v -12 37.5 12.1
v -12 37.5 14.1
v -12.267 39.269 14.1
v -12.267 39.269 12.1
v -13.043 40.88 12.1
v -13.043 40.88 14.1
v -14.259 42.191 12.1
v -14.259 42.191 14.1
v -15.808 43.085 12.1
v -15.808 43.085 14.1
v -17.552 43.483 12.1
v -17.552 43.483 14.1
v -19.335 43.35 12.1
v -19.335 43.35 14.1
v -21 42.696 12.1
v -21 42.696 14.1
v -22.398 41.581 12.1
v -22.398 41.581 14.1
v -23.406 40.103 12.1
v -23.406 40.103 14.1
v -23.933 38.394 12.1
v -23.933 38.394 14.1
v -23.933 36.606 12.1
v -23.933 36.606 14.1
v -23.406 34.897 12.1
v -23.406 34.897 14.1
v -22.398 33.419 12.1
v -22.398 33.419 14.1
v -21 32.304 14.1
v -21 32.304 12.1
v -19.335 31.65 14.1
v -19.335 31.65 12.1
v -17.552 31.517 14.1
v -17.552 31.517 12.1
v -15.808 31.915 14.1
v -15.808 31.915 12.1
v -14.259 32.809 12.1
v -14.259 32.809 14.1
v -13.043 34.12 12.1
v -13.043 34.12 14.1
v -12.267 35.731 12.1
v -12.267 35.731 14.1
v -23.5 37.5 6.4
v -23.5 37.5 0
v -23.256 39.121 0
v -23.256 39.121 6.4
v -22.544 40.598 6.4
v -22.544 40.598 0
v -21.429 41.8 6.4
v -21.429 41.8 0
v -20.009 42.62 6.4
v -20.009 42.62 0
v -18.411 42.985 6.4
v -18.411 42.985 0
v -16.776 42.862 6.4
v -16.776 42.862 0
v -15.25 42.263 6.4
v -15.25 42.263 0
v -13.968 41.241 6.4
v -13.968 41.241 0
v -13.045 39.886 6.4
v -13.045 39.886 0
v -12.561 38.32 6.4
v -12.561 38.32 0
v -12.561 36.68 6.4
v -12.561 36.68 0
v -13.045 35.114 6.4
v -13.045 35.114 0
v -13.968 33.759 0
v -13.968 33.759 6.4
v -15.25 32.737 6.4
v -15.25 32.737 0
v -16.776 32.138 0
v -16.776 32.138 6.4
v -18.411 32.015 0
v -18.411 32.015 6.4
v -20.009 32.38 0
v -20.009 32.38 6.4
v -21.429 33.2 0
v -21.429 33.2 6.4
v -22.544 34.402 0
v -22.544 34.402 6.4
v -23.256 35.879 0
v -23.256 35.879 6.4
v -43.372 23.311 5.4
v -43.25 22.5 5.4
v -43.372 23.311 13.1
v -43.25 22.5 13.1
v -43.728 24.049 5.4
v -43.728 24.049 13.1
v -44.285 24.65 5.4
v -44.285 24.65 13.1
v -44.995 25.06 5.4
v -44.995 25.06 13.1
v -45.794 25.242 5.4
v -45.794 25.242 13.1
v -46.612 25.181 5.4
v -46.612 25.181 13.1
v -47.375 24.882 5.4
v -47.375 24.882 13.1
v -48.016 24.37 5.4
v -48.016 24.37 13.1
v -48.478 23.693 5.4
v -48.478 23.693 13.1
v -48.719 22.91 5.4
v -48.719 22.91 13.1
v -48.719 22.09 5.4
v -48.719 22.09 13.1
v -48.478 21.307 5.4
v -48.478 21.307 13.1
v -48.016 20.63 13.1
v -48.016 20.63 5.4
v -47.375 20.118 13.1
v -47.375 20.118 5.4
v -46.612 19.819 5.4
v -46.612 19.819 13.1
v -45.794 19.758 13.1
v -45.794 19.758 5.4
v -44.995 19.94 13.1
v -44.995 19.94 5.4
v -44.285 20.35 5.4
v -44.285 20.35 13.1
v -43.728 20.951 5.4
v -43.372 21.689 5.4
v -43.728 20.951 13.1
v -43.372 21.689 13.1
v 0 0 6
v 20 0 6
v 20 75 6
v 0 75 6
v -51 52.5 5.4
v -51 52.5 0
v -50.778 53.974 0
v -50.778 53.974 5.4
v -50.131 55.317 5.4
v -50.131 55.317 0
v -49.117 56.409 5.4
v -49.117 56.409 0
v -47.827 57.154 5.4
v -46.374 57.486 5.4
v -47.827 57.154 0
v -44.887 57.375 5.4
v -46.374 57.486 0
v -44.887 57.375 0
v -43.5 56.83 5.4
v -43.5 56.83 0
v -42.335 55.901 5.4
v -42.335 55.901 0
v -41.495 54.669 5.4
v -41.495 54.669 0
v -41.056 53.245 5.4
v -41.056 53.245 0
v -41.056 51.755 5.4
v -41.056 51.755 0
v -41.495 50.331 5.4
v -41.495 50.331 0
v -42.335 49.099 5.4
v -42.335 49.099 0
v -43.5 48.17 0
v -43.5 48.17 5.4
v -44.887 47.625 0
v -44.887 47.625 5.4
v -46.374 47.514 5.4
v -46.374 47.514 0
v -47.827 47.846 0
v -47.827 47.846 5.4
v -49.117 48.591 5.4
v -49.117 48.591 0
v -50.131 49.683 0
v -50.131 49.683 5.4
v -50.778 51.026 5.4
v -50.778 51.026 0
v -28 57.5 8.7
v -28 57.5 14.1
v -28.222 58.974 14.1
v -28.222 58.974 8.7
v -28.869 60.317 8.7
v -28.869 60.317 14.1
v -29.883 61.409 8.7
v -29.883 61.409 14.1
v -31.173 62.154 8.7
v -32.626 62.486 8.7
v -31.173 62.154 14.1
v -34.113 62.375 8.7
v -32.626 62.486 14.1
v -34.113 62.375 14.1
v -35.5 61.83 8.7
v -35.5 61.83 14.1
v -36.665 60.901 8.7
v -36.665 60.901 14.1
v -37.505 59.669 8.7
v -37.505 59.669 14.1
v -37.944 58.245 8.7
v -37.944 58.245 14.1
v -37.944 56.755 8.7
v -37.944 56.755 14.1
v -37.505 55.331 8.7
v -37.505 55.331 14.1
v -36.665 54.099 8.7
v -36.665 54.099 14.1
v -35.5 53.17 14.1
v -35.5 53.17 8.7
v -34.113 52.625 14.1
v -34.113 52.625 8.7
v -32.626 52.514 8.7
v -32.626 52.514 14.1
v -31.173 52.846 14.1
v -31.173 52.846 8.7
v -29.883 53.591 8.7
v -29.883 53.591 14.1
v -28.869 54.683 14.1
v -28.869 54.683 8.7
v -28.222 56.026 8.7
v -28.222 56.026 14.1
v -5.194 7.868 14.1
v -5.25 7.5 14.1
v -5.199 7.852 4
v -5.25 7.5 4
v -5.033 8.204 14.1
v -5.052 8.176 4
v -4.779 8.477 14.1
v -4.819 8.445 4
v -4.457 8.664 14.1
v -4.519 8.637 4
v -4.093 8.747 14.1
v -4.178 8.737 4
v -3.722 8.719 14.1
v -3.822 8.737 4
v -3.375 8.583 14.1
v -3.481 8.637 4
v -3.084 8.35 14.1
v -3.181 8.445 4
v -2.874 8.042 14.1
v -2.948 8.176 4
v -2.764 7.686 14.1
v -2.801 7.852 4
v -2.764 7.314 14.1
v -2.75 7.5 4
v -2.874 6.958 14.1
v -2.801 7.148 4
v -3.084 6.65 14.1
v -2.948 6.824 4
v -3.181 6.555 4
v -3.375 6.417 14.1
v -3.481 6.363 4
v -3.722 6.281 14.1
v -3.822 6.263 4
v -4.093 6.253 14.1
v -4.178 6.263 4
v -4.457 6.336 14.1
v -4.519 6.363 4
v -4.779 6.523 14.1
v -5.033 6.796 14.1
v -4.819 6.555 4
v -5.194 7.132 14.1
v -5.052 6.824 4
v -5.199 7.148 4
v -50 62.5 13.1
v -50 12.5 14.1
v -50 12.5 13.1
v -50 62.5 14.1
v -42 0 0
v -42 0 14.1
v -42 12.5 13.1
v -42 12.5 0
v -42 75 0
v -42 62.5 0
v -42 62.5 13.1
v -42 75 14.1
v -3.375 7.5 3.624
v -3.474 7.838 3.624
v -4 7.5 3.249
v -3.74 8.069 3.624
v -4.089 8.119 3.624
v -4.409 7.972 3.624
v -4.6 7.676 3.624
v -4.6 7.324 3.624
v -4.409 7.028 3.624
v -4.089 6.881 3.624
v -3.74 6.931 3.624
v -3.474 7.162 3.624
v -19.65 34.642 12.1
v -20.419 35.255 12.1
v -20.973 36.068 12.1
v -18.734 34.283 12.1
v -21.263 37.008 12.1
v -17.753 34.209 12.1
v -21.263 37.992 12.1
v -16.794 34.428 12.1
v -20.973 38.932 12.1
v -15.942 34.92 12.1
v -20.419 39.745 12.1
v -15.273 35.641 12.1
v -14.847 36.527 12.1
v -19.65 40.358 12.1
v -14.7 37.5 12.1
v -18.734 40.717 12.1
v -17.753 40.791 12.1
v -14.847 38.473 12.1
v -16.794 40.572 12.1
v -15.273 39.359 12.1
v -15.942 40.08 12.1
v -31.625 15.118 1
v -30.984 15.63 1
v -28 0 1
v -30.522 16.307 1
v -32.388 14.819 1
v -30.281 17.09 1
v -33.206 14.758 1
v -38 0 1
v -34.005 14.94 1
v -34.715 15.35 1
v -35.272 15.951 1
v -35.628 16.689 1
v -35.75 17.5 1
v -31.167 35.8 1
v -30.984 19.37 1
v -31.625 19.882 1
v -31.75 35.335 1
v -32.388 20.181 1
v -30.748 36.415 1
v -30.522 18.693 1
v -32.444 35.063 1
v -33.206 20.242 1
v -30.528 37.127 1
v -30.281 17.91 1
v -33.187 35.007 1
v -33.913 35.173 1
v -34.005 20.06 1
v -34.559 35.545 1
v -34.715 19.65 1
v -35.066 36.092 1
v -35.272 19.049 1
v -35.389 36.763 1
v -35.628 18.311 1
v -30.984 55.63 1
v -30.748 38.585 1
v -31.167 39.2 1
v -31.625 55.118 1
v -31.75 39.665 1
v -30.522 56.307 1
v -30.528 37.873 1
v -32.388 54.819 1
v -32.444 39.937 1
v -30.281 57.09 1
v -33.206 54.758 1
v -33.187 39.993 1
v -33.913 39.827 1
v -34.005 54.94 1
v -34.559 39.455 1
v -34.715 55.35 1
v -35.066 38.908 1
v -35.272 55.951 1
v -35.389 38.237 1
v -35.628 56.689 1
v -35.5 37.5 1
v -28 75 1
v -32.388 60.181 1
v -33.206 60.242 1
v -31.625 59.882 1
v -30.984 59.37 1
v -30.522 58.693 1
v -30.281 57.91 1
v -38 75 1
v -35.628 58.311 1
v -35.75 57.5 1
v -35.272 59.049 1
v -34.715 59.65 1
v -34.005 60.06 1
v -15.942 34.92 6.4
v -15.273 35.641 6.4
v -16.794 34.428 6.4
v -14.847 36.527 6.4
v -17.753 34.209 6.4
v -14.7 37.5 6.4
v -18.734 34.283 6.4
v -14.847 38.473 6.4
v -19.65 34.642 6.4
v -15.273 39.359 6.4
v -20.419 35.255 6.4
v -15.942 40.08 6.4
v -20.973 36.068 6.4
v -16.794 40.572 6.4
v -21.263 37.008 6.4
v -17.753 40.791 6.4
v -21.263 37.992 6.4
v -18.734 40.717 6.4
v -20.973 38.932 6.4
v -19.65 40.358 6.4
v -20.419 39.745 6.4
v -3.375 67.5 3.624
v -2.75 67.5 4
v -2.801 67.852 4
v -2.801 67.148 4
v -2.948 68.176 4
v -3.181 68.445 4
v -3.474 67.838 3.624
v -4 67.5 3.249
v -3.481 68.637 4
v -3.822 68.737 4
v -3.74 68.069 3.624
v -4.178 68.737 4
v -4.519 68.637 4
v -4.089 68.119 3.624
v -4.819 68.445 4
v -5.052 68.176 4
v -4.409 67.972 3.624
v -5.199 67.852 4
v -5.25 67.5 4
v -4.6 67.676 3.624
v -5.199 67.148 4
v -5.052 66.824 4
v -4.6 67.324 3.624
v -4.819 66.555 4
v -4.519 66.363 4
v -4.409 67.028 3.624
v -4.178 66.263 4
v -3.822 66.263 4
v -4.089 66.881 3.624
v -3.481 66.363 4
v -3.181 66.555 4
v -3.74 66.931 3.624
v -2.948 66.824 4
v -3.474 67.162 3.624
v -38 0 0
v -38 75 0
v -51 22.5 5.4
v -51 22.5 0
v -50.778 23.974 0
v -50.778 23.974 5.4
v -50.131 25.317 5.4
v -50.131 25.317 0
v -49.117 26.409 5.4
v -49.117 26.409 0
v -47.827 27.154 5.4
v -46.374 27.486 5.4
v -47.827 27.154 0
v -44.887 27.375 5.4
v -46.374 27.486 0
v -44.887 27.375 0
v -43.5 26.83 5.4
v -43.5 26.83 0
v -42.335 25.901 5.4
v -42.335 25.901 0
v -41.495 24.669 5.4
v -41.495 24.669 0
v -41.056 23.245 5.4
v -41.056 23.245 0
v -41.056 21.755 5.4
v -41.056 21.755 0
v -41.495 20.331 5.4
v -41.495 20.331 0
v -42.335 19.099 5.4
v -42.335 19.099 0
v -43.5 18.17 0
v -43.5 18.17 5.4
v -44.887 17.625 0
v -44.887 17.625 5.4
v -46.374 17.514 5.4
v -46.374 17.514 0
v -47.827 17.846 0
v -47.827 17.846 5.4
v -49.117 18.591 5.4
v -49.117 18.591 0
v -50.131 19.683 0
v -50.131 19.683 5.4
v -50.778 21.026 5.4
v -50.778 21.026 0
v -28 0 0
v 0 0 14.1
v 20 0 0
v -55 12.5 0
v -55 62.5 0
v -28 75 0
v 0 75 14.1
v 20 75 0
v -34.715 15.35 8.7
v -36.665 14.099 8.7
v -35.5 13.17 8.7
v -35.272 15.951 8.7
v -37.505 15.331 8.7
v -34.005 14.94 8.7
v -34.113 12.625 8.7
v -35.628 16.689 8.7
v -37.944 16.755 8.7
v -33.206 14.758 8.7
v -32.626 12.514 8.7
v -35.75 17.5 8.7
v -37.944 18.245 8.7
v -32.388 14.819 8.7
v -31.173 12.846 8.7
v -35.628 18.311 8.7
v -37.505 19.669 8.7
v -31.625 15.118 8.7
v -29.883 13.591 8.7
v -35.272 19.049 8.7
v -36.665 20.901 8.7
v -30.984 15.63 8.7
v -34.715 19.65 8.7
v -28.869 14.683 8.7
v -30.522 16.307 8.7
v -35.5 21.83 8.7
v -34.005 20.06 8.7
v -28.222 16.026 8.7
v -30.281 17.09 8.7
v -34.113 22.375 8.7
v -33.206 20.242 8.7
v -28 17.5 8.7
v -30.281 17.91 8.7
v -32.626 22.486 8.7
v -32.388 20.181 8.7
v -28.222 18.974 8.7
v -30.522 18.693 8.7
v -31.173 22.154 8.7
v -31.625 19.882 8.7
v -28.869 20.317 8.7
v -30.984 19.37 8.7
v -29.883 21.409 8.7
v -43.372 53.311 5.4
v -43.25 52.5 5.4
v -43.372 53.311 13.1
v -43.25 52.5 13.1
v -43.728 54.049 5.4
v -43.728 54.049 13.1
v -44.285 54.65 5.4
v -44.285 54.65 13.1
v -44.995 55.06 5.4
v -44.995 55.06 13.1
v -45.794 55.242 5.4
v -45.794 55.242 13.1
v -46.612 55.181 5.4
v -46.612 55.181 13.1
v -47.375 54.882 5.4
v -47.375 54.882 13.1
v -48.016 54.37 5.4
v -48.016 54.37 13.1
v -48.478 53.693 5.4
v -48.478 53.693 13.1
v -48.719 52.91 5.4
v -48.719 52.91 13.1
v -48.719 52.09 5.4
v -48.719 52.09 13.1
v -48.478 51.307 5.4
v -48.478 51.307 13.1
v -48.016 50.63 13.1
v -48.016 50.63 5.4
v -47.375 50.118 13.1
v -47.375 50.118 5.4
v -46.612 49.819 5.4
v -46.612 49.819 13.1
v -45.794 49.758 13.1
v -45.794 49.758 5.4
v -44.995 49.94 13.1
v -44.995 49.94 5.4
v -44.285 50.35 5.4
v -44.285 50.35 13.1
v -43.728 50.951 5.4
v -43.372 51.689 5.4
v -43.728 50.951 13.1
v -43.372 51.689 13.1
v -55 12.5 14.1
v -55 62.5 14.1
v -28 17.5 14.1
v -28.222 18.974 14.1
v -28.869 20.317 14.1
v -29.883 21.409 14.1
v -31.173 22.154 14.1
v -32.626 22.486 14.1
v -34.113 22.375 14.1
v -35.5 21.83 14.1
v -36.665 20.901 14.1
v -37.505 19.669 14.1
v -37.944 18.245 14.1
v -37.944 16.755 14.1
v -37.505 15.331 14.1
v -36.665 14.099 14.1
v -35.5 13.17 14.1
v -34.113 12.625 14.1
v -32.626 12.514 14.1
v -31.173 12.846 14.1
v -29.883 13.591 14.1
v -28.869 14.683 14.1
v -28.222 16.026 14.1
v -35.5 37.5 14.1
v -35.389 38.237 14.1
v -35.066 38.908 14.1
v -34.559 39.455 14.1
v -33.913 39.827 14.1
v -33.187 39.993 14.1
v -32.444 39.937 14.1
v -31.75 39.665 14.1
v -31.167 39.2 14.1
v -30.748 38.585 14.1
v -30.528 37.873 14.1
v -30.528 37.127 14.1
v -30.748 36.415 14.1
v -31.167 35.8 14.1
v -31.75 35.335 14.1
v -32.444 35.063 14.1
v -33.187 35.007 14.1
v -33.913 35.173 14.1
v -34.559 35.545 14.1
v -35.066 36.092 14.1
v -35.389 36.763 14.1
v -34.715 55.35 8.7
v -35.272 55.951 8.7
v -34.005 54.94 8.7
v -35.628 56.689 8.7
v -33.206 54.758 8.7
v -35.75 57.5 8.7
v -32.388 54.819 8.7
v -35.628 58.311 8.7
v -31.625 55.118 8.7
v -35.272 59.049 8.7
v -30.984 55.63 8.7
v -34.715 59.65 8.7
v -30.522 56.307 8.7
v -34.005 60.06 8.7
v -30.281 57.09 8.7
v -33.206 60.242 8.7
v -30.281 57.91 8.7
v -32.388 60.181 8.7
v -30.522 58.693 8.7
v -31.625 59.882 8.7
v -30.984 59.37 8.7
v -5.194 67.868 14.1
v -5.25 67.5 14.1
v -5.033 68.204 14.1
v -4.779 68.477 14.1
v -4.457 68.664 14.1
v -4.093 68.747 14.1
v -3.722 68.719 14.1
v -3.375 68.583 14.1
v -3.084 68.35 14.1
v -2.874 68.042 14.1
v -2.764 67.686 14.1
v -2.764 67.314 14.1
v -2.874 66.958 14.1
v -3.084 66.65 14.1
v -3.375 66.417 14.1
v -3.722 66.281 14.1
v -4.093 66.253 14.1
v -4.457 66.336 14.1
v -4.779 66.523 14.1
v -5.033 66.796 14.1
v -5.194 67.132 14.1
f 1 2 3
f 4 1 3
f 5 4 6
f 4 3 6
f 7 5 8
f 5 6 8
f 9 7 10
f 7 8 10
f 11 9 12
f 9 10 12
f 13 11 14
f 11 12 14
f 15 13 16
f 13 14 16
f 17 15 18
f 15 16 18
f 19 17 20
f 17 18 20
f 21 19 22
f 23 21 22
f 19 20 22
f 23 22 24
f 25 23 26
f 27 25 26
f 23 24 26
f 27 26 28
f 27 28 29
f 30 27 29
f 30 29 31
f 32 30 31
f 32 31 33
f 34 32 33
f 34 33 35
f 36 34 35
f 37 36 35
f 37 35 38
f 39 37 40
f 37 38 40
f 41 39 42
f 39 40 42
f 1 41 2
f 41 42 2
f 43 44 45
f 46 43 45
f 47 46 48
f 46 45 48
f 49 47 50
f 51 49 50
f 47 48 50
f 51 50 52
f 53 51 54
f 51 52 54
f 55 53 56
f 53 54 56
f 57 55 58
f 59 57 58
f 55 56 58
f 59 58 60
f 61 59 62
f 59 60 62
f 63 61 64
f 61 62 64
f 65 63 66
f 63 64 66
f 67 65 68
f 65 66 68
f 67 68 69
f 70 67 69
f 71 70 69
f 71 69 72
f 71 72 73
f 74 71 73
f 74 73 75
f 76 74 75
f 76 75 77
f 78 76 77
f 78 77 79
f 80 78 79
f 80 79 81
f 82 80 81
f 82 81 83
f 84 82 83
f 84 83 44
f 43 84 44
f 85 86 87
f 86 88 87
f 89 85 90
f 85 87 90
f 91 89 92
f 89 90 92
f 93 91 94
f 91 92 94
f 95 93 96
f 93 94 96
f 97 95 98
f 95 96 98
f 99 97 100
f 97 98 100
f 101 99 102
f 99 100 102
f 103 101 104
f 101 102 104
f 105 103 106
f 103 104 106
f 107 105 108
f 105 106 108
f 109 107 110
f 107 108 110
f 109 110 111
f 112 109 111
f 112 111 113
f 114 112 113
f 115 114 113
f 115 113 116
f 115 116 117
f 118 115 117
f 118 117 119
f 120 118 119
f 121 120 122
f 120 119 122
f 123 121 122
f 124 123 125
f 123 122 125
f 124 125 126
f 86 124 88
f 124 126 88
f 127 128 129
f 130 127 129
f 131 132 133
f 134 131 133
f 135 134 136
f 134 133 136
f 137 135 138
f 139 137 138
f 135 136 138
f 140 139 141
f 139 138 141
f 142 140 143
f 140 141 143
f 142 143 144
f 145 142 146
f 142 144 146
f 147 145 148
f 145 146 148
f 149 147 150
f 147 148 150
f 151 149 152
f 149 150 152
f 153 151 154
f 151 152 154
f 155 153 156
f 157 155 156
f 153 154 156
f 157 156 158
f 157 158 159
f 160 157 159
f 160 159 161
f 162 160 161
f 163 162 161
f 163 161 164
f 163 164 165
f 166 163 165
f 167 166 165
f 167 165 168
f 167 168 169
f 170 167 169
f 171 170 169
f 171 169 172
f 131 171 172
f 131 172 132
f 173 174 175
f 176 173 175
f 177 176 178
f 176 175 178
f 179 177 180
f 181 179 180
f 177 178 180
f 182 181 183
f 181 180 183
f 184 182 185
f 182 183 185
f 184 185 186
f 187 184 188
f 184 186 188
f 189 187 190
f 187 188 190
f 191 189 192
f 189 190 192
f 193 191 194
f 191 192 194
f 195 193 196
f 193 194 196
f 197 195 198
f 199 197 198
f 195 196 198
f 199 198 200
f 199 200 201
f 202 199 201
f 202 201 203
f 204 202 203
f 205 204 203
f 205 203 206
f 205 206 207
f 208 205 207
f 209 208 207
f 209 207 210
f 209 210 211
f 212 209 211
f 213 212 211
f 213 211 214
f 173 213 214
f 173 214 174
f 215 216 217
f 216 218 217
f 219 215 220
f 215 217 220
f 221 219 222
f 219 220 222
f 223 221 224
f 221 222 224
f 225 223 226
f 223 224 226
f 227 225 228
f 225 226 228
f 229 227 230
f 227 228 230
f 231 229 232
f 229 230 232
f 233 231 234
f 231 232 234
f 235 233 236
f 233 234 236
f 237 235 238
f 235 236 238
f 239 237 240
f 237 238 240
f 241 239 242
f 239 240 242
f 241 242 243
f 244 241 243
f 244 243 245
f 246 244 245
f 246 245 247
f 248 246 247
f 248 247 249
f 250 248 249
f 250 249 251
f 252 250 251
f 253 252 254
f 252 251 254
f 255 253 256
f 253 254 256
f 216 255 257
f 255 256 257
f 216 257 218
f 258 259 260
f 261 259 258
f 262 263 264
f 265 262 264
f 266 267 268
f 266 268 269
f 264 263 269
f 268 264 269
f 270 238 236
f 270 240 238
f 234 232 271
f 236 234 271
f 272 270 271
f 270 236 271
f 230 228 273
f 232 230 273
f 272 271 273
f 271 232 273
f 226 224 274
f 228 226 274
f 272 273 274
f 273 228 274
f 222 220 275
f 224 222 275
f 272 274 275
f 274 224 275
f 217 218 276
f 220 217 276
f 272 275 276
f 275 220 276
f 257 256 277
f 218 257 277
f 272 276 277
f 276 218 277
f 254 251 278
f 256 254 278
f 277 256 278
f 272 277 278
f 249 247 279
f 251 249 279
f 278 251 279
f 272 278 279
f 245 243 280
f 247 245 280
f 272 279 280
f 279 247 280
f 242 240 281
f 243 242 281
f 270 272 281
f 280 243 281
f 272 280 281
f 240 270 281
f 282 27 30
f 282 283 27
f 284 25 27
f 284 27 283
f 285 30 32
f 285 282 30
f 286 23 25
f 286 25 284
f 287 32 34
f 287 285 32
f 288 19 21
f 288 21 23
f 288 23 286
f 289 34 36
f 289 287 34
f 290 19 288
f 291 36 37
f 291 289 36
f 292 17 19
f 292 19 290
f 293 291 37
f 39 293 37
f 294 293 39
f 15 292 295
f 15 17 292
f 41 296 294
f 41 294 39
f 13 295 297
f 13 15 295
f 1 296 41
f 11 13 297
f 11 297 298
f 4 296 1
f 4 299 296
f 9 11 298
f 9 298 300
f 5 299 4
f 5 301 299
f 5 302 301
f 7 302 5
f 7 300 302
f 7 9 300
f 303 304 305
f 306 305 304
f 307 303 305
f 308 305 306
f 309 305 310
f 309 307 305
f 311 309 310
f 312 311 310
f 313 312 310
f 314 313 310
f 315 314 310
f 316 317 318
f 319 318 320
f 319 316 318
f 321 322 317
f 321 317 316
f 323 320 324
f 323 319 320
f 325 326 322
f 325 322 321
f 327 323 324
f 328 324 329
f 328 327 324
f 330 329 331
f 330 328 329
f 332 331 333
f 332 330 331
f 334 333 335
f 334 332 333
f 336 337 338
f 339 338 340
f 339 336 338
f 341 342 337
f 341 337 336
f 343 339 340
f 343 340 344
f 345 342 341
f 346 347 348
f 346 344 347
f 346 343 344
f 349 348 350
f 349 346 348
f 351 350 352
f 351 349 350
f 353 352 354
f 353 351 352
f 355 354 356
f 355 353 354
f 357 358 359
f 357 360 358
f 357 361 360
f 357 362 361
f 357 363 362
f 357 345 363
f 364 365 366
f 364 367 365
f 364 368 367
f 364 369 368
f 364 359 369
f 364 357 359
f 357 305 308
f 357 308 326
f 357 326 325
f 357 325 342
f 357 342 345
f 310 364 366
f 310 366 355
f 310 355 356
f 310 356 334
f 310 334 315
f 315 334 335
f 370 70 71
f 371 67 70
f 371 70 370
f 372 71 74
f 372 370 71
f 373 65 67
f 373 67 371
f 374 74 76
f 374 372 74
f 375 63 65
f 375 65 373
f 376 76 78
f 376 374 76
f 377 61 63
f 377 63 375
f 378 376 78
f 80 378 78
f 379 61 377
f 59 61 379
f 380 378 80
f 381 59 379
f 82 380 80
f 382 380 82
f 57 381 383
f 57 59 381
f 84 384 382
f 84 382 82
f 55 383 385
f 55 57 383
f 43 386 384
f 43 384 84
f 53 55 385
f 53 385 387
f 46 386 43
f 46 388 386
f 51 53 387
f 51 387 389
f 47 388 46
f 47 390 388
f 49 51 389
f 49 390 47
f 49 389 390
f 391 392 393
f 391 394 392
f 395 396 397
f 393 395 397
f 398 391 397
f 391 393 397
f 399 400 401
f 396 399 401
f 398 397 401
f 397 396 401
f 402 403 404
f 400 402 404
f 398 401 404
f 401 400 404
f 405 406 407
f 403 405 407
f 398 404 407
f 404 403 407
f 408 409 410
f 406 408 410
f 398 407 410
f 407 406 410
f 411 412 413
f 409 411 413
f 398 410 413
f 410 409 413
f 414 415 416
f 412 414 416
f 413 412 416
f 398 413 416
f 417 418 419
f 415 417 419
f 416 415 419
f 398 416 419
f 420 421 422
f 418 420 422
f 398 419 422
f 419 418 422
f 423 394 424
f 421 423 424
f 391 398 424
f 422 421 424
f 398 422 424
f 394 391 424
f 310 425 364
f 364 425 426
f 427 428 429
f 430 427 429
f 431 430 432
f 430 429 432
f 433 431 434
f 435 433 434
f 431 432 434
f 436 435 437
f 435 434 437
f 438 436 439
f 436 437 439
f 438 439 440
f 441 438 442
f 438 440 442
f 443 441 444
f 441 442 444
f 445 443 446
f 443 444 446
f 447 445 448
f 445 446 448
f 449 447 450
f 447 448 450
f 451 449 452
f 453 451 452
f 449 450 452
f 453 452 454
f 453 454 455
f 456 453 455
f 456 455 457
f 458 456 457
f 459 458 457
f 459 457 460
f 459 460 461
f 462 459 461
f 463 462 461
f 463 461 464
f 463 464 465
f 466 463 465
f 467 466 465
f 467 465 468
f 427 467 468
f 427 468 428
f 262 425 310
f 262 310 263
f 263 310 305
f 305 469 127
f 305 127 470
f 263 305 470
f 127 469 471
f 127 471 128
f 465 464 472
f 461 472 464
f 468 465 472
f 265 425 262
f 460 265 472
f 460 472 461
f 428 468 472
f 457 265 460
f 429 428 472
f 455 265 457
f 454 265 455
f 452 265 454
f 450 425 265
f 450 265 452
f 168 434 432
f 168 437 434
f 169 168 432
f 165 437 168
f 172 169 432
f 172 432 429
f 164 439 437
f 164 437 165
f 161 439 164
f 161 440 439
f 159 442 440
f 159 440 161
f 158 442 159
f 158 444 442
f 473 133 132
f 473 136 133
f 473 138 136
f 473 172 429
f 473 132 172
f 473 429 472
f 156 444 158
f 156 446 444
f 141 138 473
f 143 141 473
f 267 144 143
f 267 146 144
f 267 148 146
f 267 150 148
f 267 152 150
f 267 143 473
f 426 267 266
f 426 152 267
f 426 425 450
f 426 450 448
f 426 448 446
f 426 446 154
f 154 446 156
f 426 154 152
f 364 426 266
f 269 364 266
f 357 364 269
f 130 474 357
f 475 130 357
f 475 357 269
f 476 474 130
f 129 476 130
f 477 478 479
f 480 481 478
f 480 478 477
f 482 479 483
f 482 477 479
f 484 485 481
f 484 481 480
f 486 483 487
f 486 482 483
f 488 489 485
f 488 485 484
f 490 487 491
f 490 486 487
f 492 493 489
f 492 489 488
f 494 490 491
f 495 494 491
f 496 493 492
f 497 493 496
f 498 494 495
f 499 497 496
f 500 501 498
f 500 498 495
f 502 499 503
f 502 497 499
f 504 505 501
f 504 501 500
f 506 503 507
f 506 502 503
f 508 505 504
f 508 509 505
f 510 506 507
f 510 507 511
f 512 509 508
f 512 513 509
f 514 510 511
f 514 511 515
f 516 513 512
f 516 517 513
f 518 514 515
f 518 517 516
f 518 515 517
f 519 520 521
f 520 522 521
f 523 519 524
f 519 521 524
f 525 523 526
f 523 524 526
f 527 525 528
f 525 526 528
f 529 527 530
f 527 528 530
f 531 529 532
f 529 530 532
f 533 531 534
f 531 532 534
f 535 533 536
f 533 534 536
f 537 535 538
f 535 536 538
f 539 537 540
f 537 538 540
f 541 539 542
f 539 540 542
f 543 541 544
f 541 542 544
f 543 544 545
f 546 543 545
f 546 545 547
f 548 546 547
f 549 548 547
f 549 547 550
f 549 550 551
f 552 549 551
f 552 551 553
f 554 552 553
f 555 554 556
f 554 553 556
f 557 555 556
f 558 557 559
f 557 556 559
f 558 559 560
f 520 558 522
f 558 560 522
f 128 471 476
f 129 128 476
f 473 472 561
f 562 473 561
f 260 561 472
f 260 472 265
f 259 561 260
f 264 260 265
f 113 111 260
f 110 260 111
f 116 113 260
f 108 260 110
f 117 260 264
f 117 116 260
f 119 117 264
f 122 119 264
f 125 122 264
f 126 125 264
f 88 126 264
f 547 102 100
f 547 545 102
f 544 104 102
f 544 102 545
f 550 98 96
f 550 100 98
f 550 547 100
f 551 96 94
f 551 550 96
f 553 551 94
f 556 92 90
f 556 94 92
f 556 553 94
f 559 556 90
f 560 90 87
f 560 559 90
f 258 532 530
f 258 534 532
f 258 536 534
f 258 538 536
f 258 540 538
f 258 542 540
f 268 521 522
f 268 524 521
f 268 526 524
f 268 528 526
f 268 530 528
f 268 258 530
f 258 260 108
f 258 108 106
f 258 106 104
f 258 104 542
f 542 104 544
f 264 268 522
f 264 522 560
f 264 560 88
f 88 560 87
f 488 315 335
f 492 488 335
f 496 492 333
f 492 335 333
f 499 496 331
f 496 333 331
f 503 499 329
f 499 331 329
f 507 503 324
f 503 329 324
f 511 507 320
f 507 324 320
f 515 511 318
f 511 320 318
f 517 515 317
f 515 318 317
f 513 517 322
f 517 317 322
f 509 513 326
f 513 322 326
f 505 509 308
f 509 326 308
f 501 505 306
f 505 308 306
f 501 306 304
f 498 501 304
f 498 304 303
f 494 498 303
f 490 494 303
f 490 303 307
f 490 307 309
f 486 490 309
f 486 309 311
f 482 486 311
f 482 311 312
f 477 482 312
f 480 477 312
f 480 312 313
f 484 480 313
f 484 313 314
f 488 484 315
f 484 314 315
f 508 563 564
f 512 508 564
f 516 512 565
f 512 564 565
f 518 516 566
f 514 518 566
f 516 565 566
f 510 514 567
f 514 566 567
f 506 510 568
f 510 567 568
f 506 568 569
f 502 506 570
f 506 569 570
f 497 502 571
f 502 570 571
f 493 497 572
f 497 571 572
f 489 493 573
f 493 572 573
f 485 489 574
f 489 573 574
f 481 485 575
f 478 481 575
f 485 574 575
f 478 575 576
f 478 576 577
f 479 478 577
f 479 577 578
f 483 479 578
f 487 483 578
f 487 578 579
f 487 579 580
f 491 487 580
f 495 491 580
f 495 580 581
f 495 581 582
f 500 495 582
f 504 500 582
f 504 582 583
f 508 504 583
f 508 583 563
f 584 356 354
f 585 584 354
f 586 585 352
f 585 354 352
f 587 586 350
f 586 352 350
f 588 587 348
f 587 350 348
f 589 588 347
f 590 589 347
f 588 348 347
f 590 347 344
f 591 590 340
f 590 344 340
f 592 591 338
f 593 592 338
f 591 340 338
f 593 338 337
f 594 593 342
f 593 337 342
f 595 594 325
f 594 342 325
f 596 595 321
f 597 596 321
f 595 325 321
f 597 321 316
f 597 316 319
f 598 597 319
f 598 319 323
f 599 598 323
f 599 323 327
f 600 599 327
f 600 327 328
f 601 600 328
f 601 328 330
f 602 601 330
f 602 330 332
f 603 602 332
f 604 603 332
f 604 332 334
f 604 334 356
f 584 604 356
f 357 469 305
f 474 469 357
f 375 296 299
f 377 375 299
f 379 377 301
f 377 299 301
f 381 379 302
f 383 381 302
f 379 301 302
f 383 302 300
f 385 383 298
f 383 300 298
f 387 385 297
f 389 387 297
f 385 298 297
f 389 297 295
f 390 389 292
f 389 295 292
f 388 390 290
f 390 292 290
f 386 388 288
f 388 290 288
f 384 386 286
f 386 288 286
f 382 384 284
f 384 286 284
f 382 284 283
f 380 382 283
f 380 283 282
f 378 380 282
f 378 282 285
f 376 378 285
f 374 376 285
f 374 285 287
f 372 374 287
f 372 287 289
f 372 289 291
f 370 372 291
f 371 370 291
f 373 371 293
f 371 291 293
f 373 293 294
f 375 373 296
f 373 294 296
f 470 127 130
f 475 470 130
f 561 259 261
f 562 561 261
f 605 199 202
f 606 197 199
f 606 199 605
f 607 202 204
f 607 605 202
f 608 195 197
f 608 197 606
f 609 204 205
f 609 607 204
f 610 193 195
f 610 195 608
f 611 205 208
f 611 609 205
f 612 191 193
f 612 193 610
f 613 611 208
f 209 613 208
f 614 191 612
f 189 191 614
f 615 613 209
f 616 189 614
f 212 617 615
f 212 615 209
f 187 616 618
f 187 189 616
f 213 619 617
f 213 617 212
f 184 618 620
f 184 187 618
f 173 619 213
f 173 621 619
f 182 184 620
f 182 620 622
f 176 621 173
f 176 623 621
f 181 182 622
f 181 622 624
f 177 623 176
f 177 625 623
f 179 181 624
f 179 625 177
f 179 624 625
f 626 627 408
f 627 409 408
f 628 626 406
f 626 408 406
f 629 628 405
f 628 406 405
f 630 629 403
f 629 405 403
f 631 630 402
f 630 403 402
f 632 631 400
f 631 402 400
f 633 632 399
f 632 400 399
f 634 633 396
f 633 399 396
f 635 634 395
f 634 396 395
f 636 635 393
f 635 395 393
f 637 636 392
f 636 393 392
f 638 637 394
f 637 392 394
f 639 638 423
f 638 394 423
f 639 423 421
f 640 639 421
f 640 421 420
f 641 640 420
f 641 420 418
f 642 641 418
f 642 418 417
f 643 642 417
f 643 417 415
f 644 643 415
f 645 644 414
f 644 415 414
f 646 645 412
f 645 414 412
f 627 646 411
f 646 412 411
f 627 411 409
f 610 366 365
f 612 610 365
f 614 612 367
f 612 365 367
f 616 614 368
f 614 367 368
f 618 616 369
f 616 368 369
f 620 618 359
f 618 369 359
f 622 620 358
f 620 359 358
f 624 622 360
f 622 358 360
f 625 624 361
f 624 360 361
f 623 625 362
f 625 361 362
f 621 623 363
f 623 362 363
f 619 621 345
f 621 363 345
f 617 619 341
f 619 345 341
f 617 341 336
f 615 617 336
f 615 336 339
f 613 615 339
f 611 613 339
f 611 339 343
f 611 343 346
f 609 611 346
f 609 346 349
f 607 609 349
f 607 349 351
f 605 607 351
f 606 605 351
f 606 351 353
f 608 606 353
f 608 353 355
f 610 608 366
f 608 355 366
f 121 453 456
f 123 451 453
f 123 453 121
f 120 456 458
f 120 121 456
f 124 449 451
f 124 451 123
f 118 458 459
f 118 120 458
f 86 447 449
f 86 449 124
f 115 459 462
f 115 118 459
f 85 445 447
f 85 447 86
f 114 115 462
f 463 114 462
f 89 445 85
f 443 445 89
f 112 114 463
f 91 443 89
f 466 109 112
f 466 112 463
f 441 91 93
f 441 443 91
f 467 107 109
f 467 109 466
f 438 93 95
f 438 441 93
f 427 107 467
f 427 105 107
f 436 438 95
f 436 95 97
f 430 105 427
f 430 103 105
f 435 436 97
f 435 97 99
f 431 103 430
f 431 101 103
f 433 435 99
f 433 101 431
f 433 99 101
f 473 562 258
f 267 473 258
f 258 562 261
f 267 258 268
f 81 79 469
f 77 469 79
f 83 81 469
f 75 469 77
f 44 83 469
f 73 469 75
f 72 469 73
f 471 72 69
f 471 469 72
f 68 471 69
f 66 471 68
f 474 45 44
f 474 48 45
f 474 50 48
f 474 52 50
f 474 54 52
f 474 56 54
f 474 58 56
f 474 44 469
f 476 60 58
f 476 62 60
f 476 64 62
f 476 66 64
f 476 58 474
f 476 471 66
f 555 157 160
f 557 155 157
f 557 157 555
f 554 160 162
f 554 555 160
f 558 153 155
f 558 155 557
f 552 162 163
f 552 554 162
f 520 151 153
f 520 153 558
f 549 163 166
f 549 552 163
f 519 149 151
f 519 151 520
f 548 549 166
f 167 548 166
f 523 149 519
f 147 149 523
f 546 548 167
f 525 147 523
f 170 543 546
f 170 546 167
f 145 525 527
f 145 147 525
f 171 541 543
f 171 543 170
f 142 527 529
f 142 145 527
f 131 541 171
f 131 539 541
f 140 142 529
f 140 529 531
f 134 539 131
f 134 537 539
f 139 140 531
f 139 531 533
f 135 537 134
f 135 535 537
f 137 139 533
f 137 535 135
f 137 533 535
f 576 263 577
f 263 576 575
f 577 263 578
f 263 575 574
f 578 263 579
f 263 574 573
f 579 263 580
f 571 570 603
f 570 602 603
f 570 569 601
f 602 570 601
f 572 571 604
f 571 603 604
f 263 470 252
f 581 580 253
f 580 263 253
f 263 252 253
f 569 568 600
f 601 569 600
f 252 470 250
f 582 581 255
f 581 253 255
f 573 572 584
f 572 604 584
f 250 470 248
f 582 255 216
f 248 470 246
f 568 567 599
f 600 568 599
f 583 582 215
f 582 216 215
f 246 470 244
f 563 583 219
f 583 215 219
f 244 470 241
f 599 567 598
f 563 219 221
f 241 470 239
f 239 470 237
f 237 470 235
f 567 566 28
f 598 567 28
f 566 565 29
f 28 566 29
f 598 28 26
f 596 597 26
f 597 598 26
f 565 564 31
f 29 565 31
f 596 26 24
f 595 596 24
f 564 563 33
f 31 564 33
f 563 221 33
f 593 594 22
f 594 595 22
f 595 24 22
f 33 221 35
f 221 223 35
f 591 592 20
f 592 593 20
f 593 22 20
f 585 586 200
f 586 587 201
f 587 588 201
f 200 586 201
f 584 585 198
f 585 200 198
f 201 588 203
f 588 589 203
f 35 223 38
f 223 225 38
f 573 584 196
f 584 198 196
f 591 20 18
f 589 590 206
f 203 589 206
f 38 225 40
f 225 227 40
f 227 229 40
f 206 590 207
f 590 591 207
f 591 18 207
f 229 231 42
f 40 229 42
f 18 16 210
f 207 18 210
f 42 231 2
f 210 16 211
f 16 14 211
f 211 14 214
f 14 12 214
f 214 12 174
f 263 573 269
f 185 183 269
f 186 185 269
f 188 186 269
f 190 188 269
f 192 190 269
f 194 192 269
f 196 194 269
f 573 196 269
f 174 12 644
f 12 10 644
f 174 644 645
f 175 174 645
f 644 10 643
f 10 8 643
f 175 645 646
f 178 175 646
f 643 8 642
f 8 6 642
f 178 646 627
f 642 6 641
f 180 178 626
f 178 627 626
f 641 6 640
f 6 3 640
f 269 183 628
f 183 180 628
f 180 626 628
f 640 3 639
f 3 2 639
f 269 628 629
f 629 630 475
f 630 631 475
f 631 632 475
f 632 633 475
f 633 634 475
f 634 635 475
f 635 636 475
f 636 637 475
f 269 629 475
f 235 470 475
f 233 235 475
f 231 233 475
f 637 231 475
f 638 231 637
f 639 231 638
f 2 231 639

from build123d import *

# Parameters (mm, degrees)
SKETCH_1_W                   = 20
SKETCH_1_H                   = 75
EXTRUDE_1_DEPTH              = 6
SKETCH_2_W                   = 6
SKETCH_2_H                   = 75
EXTRUDE_2_DEPTH              = 20
SKETCH_3_W                   = 20
SKETCH_3_H                   = 75
EXTRUDE_3_DEPTH              = 8.1
SKETCH_4_W                   = 14.1
SKETCH_4_H                   = 75
EXTRUDE_4_DEPTH              = 35
HOLE_WIZARD_M6_1_D           = 6.6
HOLE_WIZARD_M6_1_CBORE_D     = 11
HOLE_WIZARD_M6_1_CBORE_DEPTH = 6.4
SKETCH_9_R                   = 6
CUT_EXTRUDE_1_DEPTH          = 2
HOLE_WIZARD_M3_1_D           = 2.5
HOLE_WIZARD_M3_1_DEPTH       = 10.1
HOLE_WIZARD_M3_1_TIP         = 0.751075774
SKETCH_15_W                  = 8
SKETCH_15_H                  = 75
CUT_EXTRUDE_3_DEPTH          = 1
HOLE_WIZARD_M5_1_D           = 5.5
HOLE_WIZARD_M5_1_CBORE_D     = 10
HOLE_WIZARD_M5_1_CBORE_DEPTH = 5.4
HOLE_WIZARD_M6_1_2_D         = 5
HOLE_WIZARD_M6_1_2_DEPTH     = 15
HOLE_WIZARD_M6_1_2_TIP       = 1.502151548
HOLE_WIZARD_M5_2_D           = 5.5
HOLE_WIZARD_M5_2_CBORE_D     = 10
HOLE_WIZARD_M5_2_CBORE_DEPTH = 5.4
SKETCH_24_W                  = 10
SKETCH_24_H                  = 75
CUT_EXTRUDE_4_DEPTH          = 1
SKETCH_25_W                  = 13
SKETCH_25_H                  = 12.5
CUT_EXTRUDE_5_DEPTH          = 15.1


with BuildPart() as part:
    # 草图1 → 凸台-拉伸1 (new body)
    with BuildSketch(Plane.XY):
        with Locations((10, 37.5)):
            Rectangle(SKETCH_1_W, SKETCH_1_H)
    extrude(amount=EXTRUDE_1_DEPTH)

    # 草图2 → 凸台-拉伸2 (add)
    with BuildSketch(Plane.ZY):
        with Locations((3, 37.5)):
            Rectangle(SKETCH_2_W, SKETCH_2_H)
    extrude(amount=EXTRUDE_2_DEPTH)

    # 草图3 → 凸台-拉伸3 (add)
    with BuildSketch(Plane.XY.offset(6)):
        with Locations((-10, 37.5)):
            Rectangle(SKETCH_3_W, SKETCH_3_H)
    extrude(amount=EXTRUDE_3_DEPTH)

    # 草图4 → 凸台-拉伸4 (add)
    with BuildSketch(Plane.ZY.offset(20)):
        with Locations((7.05, 37.5)):
            Rectangle(SKETCH_4_W, SKETCH_4_H)
    extrude(amount=EXTRUDE_4_DEPTH)

    # Hole Wizard M6 _1 (through all)
    with Locations(Plane(origin=(0, 0, 0), x_dir=(-1, 0, 0), z_dir=(0, 0, -1))):
        with Locations((18, 37.5)):
            CounterBoreHole(HOLE_WIZARD_M6_1_D / 2, HOLE_WIZARD_M6_1_CBORE_D / 2, HOLE_WIZARD_M6_1_CBORE_DEPTH)

    # 草图9 → 切除-拉伸1 (cut)
    with BuildSketch(Plane.XY.offset(14.1)):
        with Locations((-18, 37.5)):
            Circle(SKETCH_9_R)
    extrude(amount=-CUT_EXTRUDE_1_DEPTH, mode=Mode.SUBTRACT)

    # M3 螺纹孔1
    with Locations(Plane.XY.offset(14.1)):
        with Locations((-4, 7.5), (-4, 67.5)):
            Hole(HOLE_WIZARD_M3_1_D / 2, depth=HOLE_WIZARD_M3_1_DEPTH)
            with Locations((0, 0, -(HOLE_WIZARD_M3_1_DEPTH + HOLE_WIZARD_M3_1_TIP / 2))):  # 118° drill point
                Cone(0, HOLE_WIZARD_M3_1_D / 2, HOLE_WIZARD_M3_1_TIP, mode=Mode.SUBTRACT)

    # 草图15 → 切除-拉伸3 (cut)
    with BuildSketch(Plane.XY.offset(14.1)):
        with Locations((-46, 37.5)):
            Rectangle(SKETCH_15_W, SKETCH_15_H)
    extrude(amount=-CUT_EXTRUDE_3_DEPTH, mode=Mode.SUBTRACT)

    # M5 六角凹头螺钉的柱形沉头孔1 (through all)
    with Locations(Plane(origin=(0, 0, 0), x_dir=(-1, 0, 0), z_dir=(0, 0, -1))):
        with Locations((46, 52.5), (46, 22.5)):
            CounterBoreHole(HOLE_WIZARD_M5_1_D / 2, HOLE_WIZARD_M5_1_CBORE_D / 2, HOLE_WIZARD_M5_1_CBORE_DEPTH)

    # Hole Wizard M6 _1 2
    with Locations(Plane.XY.offset(14.1)):
        with Locations((-33, 37.5)):
            Hole(HOLE_WIZARD_M6_1_2_D / 2, depth=HOLE_WIZARD_M6_1_2_DEPTH)
            with Locations((0, 0, -(HOLE_WIZARD_M6_1_2_DEPTH + HOLE_WIZARD_M6_1_2_TIP / 2))):  # 118° drill point
                Cone(0, HOLE_WIZARD_M6_1_2_D / 2, HOLE_WIZARD_M6_1_2_TIP, mode=Mode.SUBTRACT)

    # M5 六角凹头螺钉的柱形沉头孔2 (through all)
    with Locations(Plane.XY.offset(14.1)):
        with Locations((-33, 57.5), (-33, 17.5)):
            CounterBoreHole(HOLE_WIZARD_M5_2_D / 2, HOLE_WIZARD_M5_2_CBORE_D / 2, HOLE_WIZARD_M5_2_CBORE_DEPTH)

    # 草图24 → 切除-拉伸4 (cut)
    with BuildSketch(Plane(origin=(0, 0, 0), x_dir=(-1, 0, 0), z_dir=(0, 0, -1))):
        with Locations((33, 37.5)):
            Rectangle(SKETCH_24_W, SKETCH_24_H)
    extrude(amount=-CUT_EXTRUDE_4_DEPTH, mode=Mode.SUBTRACT)

    # 草图25 → 切除-拉伸5 (cut, through all)
    with BuildSketch(Plane.XY.offset(14.1)):
        with Locations((-48.5, 6.25)):
            Rectangle(SKETCH_25_W, SKETCH_25_H)
        with Locations((-48.5, 68.75)):
            Rectangle(SKETCH_25_W, SKETCH_25_H)
    extrude(amount=-CUT_EXTRUDE_5_DEPTH, mode=Mode.SUBTRACT)


solid = part.part
